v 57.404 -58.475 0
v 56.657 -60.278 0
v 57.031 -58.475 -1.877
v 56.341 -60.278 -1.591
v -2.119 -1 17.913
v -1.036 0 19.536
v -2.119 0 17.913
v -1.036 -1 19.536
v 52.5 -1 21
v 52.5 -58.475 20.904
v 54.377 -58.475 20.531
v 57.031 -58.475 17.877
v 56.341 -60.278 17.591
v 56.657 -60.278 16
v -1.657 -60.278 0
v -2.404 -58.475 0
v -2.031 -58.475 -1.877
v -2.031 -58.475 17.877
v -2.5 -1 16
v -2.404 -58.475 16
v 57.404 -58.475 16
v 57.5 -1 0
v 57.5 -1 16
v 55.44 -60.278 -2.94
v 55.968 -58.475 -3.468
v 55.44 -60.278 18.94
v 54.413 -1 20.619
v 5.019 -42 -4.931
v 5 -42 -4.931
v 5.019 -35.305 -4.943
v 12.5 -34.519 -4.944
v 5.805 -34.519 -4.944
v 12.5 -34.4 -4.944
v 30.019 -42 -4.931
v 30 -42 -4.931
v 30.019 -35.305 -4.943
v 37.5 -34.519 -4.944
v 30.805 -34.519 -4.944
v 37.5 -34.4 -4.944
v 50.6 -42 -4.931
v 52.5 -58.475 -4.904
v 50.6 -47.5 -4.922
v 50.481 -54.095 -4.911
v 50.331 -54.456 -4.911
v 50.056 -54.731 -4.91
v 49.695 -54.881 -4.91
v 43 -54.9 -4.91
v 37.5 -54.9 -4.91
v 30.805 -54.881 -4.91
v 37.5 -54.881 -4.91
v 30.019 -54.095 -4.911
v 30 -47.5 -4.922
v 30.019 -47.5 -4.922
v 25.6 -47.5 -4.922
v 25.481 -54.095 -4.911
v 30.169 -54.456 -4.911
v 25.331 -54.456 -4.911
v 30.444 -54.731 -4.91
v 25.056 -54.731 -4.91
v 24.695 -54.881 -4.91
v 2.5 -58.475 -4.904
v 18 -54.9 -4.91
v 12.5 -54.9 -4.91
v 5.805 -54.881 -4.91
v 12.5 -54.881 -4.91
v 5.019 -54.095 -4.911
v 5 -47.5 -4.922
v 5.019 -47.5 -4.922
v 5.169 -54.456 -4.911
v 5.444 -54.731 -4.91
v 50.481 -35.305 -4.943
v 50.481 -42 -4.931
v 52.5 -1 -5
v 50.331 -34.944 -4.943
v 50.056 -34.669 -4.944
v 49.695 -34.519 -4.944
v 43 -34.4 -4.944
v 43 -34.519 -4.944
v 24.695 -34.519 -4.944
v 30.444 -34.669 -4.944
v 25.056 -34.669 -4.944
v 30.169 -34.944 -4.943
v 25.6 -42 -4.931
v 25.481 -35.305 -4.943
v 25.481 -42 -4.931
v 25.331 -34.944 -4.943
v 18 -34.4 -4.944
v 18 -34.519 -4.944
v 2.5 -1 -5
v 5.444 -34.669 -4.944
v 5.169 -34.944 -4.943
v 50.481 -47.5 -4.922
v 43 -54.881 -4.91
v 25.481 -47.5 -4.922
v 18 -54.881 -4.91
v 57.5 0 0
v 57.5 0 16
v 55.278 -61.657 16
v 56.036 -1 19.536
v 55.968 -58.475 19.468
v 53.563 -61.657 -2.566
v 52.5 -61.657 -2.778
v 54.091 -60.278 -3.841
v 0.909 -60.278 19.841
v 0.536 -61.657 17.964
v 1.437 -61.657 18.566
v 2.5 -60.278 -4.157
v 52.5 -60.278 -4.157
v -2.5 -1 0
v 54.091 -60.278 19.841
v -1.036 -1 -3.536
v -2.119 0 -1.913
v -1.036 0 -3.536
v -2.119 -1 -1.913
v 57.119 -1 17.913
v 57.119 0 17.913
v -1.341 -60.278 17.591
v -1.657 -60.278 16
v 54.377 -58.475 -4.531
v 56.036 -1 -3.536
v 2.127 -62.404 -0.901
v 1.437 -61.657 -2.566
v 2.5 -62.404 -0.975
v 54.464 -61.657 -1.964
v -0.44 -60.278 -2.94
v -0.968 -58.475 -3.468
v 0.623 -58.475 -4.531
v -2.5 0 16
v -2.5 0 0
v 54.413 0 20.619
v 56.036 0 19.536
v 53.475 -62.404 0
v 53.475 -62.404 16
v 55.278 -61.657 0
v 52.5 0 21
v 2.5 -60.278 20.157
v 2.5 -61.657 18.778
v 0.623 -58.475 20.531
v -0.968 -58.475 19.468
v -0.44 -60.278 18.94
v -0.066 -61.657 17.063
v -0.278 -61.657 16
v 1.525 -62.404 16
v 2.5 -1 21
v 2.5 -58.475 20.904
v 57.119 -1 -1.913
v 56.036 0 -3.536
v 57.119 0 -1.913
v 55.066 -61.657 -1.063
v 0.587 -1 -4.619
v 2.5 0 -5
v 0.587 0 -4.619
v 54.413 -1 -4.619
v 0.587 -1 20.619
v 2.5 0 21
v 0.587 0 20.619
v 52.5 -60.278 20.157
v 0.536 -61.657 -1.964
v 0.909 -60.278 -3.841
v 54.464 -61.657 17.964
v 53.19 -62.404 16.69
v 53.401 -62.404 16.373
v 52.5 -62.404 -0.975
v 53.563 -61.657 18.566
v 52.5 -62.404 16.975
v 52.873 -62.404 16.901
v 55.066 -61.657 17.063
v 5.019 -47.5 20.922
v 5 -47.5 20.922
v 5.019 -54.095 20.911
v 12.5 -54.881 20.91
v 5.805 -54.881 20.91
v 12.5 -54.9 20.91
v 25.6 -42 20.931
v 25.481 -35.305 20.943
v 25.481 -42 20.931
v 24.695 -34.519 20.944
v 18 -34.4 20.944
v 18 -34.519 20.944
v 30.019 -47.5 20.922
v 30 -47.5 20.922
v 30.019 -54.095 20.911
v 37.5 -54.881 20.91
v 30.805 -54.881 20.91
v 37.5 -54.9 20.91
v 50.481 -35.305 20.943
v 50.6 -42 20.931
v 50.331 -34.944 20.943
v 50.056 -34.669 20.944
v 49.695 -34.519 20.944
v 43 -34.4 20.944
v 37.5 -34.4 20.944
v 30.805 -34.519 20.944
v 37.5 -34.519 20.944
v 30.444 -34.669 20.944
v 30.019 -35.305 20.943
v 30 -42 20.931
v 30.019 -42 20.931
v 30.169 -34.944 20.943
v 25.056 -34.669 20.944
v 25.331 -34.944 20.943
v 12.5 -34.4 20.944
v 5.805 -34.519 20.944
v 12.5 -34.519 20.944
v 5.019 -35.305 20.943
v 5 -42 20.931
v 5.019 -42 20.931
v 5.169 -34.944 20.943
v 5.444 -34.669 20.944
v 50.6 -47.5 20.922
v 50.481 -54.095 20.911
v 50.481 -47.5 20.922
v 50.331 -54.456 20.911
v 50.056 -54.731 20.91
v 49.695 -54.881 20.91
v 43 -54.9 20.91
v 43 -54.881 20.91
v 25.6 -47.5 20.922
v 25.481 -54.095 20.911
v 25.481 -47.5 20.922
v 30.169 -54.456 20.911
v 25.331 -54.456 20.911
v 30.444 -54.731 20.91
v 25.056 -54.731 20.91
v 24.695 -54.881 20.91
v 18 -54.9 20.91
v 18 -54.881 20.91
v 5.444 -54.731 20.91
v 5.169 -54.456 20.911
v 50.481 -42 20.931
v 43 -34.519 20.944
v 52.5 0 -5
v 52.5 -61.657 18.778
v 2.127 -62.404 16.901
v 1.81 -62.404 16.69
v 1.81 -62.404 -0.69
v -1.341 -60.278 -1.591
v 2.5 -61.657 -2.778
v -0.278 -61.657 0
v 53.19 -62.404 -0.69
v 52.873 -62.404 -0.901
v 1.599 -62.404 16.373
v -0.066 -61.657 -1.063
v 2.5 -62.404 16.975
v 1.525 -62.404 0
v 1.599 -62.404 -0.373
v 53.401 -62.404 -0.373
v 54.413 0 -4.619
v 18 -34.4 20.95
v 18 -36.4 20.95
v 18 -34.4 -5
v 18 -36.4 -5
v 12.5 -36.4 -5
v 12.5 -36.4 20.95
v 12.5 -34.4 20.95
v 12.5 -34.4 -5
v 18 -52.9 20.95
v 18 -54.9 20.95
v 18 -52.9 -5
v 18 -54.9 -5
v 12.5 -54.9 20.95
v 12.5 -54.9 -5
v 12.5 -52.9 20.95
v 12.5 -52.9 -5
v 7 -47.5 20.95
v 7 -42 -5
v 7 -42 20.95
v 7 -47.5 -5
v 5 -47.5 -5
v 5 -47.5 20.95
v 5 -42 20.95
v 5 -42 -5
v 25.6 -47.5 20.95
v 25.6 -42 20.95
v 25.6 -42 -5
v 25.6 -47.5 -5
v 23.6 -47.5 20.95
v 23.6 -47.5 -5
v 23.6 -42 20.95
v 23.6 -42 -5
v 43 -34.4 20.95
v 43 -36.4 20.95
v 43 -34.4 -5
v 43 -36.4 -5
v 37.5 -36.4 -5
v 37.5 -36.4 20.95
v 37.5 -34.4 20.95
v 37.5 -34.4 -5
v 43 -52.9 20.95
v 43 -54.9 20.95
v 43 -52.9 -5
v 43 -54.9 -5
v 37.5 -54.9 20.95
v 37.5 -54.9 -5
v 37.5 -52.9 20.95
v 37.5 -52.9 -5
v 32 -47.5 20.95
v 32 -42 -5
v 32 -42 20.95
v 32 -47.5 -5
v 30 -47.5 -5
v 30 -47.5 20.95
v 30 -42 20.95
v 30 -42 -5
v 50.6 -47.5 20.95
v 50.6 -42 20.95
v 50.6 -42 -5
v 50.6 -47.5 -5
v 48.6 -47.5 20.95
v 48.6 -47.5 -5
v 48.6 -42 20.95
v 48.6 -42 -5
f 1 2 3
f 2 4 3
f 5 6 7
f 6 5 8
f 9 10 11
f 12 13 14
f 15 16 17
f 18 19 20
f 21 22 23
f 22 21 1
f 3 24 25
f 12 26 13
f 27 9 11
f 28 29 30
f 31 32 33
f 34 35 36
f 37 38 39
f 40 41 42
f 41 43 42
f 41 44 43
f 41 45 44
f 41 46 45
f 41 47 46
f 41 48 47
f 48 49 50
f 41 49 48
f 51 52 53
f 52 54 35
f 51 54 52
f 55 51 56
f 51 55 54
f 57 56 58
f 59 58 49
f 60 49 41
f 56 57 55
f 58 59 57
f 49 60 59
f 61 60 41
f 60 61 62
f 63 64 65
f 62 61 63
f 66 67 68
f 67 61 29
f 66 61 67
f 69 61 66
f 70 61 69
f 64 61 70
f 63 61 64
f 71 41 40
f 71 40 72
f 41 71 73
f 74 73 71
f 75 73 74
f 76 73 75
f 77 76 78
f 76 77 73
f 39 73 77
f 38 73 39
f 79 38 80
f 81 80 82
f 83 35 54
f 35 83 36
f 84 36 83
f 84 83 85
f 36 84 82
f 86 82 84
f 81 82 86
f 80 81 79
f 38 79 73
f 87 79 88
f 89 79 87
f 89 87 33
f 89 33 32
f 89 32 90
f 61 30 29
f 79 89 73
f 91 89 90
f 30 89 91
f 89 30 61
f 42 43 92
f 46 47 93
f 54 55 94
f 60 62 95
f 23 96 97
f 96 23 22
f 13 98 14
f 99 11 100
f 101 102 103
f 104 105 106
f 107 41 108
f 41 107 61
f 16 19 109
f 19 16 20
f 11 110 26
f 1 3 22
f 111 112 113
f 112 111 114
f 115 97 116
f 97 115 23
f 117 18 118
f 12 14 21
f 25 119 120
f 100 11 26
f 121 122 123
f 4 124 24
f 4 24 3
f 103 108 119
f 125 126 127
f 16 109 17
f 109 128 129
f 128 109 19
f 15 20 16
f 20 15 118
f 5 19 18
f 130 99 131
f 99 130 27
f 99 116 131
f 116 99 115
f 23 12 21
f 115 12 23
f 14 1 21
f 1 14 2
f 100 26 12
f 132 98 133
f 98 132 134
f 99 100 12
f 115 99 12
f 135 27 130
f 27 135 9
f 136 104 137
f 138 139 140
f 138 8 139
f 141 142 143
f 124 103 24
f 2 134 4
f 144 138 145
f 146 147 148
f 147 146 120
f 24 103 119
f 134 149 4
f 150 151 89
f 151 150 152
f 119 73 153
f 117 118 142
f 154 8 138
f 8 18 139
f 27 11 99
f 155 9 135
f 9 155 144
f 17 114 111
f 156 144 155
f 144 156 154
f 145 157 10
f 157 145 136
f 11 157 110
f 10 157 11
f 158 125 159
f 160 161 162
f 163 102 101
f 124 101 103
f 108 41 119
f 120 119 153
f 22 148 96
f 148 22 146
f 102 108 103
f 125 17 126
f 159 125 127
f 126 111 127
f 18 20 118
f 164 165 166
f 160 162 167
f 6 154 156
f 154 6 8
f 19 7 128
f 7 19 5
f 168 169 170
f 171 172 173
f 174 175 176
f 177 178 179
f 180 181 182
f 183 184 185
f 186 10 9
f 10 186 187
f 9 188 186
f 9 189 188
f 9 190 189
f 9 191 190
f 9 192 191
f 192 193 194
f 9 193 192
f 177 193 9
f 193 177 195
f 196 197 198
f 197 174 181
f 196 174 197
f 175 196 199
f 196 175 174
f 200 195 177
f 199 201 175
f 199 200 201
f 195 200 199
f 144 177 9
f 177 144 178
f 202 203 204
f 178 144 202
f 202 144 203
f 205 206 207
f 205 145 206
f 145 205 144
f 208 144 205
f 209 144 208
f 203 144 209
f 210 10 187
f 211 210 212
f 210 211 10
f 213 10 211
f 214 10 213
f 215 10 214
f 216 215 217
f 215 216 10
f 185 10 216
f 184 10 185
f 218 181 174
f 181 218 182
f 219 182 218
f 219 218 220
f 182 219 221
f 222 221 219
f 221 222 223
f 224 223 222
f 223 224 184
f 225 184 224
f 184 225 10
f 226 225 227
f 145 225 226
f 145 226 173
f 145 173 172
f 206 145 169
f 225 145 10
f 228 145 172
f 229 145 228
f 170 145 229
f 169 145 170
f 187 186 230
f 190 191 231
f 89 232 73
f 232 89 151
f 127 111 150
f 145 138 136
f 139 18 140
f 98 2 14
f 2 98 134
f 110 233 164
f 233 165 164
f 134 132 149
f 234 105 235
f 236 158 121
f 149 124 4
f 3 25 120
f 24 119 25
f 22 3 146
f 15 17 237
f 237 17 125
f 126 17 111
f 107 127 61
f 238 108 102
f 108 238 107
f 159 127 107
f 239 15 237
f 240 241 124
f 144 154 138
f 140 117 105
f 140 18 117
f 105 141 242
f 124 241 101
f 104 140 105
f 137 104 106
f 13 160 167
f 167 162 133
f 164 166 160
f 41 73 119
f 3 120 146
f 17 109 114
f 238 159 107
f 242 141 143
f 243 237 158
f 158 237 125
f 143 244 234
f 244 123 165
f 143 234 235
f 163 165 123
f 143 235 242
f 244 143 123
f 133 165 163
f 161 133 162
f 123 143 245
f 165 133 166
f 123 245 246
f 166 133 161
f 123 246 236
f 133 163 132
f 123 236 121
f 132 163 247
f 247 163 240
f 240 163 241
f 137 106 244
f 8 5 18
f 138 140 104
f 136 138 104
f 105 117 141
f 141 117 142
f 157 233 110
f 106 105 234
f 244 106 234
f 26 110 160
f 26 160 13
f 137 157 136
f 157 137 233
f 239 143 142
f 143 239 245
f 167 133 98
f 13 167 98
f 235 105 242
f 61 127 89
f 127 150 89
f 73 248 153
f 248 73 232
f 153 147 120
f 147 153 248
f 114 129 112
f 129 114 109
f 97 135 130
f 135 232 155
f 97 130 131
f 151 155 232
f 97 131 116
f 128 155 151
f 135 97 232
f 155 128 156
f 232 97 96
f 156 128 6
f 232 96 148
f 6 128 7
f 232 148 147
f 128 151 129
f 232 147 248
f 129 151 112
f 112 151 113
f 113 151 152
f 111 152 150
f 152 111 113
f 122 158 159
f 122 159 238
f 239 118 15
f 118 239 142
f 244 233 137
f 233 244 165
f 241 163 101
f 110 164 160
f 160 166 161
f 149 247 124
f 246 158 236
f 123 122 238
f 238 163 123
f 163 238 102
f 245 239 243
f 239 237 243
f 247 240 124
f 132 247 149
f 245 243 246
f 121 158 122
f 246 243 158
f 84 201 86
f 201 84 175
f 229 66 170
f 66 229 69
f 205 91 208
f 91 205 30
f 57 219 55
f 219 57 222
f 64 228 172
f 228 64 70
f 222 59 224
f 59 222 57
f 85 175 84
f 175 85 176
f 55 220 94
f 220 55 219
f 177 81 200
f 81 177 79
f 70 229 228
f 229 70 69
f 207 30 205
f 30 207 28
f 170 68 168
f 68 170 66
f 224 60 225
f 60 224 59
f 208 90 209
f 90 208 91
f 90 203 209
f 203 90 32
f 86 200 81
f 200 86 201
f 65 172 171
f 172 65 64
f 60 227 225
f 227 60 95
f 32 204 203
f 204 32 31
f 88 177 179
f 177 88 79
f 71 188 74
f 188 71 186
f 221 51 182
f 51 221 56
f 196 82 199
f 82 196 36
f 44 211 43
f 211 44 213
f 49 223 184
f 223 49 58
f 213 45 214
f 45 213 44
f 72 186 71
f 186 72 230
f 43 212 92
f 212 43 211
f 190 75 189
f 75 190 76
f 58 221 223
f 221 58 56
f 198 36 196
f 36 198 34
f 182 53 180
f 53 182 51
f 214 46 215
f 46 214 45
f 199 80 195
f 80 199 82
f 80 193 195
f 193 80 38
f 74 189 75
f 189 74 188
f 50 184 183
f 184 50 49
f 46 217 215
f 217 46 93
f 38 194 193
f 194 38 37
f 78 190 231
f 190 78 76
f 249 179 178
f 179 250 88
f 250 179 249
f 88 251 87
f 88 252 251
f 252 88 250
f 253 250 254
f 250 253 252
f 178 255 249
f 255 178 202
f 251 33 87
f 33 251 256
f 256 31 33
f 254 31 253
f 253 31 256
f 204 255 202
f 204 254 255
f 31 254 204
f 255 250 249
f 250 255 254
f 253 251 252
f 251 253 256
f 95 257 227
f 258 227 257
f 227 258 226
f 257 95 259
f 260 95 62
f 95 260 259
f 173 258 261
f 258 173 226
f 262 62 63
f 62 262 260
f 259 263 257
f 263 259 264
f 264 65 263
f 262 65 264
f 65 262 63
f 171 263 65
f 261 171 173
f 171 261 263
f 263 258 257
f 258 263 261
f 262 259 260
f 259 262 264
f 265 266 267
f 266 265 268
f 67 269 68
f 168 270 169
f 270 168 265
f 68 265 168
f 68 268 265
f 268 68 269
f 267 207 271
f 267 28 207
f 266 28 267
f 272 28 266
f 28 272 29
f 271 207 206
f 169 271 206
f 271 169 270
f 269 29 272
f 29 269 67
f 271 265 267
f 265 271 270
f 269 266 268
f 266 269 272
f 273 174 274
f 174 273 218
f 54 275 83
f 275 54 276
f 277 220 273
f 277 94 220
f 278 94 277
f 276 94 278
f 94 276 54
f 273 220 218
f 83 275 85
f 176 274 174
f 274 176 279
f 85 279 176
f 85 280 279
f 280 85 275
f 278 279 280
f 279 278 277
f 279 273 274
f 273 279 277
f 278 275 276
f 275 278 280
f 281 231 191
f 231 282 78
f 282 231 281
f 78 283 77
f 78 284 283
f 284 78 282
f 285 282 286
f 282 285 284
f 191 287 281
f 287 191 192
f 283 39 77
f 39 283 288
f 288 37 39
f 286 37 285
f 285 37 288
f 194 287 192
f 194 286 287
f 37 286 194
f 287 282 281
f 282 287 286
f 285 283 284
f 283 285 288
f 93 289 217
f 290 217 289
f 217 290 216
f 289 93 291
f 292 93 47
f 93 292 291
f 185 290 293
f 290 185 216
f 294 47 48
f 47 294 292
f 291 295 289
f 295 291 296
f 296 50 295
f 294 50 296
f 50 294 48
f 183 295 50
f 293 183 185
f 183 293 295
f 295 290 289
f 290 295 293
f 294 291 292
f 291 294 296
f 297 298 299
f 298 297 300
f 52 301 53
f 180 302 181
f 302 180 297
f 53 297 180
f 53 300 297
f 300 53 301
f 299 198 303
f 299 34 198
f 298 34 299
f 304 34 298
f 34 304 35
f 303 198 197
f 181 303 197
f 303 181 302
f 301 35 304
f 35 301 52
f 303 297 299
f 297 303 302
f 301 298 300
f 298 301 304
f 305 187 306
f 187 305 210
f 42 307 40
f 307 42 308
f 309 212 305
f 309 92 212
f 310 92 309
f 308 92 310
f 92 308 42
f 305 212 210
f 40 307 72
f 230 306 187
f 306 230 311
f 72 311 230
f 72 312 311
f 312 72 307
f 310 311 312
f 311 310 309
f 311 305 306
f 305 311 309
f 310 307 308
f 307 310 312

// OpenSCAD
$fn=16;

rotate(a=[90,0,0]) union() {
    difference() {
        hull() {
            for (i=[0:3])
                translate([(i % 2) * 50 + 2.5, (i - i % 2) * 8, 0]) {
                    cylinder(r=5, h=1);
                    translate([0, 0, 57.5]) sphere(5);
                }
        }
        translate(v=[5,-6,35]) hull() {
            for (i=[0:3])
                translate([(i % 2) * 18.5 +1, (i - i % 2) * 15.75, 0]) {
                    translate([0, 0, 18.9]) sphere(1);
                    translate([0, 0, 0.5]) sphere(1);
                }
        }
        translate(v=[30,-6,35]) hull() {
            for (i=[0:3])
                translate([(i % 2) * 18.5 +1, (i - i % 2) * 15.75, 0]) {
                    translate([0, 0, 18.9]) sphere(1);
                    translate([0, 0, 0.5]) sphere(1);
                }
        }
    }
    
    translate(v=[12.5,-5,34.4]) cube([5.5,25.95,2]);
    translate(v=[12.5,-5,52.9]) cube([5.5,25.95,2]);
    translate(v=[5,-5,42]) cube([2,25.95,5.5]);
    translate(v=[23.6,-5,42]) cube([2,25.95,5.5]);
    
    
    translate(v=[37.5,-5,34.4]) cube([5.5,25.95,2]);
    translate(v=[37.5,-5,52.9]) cube([5.5,25.95,2]);
    translate(v=[30,-5,42]) cube([2,25.95,5.5]);
    translate(v=[48.6,-5,42]) cube([2,25.95,5.5]);
}
